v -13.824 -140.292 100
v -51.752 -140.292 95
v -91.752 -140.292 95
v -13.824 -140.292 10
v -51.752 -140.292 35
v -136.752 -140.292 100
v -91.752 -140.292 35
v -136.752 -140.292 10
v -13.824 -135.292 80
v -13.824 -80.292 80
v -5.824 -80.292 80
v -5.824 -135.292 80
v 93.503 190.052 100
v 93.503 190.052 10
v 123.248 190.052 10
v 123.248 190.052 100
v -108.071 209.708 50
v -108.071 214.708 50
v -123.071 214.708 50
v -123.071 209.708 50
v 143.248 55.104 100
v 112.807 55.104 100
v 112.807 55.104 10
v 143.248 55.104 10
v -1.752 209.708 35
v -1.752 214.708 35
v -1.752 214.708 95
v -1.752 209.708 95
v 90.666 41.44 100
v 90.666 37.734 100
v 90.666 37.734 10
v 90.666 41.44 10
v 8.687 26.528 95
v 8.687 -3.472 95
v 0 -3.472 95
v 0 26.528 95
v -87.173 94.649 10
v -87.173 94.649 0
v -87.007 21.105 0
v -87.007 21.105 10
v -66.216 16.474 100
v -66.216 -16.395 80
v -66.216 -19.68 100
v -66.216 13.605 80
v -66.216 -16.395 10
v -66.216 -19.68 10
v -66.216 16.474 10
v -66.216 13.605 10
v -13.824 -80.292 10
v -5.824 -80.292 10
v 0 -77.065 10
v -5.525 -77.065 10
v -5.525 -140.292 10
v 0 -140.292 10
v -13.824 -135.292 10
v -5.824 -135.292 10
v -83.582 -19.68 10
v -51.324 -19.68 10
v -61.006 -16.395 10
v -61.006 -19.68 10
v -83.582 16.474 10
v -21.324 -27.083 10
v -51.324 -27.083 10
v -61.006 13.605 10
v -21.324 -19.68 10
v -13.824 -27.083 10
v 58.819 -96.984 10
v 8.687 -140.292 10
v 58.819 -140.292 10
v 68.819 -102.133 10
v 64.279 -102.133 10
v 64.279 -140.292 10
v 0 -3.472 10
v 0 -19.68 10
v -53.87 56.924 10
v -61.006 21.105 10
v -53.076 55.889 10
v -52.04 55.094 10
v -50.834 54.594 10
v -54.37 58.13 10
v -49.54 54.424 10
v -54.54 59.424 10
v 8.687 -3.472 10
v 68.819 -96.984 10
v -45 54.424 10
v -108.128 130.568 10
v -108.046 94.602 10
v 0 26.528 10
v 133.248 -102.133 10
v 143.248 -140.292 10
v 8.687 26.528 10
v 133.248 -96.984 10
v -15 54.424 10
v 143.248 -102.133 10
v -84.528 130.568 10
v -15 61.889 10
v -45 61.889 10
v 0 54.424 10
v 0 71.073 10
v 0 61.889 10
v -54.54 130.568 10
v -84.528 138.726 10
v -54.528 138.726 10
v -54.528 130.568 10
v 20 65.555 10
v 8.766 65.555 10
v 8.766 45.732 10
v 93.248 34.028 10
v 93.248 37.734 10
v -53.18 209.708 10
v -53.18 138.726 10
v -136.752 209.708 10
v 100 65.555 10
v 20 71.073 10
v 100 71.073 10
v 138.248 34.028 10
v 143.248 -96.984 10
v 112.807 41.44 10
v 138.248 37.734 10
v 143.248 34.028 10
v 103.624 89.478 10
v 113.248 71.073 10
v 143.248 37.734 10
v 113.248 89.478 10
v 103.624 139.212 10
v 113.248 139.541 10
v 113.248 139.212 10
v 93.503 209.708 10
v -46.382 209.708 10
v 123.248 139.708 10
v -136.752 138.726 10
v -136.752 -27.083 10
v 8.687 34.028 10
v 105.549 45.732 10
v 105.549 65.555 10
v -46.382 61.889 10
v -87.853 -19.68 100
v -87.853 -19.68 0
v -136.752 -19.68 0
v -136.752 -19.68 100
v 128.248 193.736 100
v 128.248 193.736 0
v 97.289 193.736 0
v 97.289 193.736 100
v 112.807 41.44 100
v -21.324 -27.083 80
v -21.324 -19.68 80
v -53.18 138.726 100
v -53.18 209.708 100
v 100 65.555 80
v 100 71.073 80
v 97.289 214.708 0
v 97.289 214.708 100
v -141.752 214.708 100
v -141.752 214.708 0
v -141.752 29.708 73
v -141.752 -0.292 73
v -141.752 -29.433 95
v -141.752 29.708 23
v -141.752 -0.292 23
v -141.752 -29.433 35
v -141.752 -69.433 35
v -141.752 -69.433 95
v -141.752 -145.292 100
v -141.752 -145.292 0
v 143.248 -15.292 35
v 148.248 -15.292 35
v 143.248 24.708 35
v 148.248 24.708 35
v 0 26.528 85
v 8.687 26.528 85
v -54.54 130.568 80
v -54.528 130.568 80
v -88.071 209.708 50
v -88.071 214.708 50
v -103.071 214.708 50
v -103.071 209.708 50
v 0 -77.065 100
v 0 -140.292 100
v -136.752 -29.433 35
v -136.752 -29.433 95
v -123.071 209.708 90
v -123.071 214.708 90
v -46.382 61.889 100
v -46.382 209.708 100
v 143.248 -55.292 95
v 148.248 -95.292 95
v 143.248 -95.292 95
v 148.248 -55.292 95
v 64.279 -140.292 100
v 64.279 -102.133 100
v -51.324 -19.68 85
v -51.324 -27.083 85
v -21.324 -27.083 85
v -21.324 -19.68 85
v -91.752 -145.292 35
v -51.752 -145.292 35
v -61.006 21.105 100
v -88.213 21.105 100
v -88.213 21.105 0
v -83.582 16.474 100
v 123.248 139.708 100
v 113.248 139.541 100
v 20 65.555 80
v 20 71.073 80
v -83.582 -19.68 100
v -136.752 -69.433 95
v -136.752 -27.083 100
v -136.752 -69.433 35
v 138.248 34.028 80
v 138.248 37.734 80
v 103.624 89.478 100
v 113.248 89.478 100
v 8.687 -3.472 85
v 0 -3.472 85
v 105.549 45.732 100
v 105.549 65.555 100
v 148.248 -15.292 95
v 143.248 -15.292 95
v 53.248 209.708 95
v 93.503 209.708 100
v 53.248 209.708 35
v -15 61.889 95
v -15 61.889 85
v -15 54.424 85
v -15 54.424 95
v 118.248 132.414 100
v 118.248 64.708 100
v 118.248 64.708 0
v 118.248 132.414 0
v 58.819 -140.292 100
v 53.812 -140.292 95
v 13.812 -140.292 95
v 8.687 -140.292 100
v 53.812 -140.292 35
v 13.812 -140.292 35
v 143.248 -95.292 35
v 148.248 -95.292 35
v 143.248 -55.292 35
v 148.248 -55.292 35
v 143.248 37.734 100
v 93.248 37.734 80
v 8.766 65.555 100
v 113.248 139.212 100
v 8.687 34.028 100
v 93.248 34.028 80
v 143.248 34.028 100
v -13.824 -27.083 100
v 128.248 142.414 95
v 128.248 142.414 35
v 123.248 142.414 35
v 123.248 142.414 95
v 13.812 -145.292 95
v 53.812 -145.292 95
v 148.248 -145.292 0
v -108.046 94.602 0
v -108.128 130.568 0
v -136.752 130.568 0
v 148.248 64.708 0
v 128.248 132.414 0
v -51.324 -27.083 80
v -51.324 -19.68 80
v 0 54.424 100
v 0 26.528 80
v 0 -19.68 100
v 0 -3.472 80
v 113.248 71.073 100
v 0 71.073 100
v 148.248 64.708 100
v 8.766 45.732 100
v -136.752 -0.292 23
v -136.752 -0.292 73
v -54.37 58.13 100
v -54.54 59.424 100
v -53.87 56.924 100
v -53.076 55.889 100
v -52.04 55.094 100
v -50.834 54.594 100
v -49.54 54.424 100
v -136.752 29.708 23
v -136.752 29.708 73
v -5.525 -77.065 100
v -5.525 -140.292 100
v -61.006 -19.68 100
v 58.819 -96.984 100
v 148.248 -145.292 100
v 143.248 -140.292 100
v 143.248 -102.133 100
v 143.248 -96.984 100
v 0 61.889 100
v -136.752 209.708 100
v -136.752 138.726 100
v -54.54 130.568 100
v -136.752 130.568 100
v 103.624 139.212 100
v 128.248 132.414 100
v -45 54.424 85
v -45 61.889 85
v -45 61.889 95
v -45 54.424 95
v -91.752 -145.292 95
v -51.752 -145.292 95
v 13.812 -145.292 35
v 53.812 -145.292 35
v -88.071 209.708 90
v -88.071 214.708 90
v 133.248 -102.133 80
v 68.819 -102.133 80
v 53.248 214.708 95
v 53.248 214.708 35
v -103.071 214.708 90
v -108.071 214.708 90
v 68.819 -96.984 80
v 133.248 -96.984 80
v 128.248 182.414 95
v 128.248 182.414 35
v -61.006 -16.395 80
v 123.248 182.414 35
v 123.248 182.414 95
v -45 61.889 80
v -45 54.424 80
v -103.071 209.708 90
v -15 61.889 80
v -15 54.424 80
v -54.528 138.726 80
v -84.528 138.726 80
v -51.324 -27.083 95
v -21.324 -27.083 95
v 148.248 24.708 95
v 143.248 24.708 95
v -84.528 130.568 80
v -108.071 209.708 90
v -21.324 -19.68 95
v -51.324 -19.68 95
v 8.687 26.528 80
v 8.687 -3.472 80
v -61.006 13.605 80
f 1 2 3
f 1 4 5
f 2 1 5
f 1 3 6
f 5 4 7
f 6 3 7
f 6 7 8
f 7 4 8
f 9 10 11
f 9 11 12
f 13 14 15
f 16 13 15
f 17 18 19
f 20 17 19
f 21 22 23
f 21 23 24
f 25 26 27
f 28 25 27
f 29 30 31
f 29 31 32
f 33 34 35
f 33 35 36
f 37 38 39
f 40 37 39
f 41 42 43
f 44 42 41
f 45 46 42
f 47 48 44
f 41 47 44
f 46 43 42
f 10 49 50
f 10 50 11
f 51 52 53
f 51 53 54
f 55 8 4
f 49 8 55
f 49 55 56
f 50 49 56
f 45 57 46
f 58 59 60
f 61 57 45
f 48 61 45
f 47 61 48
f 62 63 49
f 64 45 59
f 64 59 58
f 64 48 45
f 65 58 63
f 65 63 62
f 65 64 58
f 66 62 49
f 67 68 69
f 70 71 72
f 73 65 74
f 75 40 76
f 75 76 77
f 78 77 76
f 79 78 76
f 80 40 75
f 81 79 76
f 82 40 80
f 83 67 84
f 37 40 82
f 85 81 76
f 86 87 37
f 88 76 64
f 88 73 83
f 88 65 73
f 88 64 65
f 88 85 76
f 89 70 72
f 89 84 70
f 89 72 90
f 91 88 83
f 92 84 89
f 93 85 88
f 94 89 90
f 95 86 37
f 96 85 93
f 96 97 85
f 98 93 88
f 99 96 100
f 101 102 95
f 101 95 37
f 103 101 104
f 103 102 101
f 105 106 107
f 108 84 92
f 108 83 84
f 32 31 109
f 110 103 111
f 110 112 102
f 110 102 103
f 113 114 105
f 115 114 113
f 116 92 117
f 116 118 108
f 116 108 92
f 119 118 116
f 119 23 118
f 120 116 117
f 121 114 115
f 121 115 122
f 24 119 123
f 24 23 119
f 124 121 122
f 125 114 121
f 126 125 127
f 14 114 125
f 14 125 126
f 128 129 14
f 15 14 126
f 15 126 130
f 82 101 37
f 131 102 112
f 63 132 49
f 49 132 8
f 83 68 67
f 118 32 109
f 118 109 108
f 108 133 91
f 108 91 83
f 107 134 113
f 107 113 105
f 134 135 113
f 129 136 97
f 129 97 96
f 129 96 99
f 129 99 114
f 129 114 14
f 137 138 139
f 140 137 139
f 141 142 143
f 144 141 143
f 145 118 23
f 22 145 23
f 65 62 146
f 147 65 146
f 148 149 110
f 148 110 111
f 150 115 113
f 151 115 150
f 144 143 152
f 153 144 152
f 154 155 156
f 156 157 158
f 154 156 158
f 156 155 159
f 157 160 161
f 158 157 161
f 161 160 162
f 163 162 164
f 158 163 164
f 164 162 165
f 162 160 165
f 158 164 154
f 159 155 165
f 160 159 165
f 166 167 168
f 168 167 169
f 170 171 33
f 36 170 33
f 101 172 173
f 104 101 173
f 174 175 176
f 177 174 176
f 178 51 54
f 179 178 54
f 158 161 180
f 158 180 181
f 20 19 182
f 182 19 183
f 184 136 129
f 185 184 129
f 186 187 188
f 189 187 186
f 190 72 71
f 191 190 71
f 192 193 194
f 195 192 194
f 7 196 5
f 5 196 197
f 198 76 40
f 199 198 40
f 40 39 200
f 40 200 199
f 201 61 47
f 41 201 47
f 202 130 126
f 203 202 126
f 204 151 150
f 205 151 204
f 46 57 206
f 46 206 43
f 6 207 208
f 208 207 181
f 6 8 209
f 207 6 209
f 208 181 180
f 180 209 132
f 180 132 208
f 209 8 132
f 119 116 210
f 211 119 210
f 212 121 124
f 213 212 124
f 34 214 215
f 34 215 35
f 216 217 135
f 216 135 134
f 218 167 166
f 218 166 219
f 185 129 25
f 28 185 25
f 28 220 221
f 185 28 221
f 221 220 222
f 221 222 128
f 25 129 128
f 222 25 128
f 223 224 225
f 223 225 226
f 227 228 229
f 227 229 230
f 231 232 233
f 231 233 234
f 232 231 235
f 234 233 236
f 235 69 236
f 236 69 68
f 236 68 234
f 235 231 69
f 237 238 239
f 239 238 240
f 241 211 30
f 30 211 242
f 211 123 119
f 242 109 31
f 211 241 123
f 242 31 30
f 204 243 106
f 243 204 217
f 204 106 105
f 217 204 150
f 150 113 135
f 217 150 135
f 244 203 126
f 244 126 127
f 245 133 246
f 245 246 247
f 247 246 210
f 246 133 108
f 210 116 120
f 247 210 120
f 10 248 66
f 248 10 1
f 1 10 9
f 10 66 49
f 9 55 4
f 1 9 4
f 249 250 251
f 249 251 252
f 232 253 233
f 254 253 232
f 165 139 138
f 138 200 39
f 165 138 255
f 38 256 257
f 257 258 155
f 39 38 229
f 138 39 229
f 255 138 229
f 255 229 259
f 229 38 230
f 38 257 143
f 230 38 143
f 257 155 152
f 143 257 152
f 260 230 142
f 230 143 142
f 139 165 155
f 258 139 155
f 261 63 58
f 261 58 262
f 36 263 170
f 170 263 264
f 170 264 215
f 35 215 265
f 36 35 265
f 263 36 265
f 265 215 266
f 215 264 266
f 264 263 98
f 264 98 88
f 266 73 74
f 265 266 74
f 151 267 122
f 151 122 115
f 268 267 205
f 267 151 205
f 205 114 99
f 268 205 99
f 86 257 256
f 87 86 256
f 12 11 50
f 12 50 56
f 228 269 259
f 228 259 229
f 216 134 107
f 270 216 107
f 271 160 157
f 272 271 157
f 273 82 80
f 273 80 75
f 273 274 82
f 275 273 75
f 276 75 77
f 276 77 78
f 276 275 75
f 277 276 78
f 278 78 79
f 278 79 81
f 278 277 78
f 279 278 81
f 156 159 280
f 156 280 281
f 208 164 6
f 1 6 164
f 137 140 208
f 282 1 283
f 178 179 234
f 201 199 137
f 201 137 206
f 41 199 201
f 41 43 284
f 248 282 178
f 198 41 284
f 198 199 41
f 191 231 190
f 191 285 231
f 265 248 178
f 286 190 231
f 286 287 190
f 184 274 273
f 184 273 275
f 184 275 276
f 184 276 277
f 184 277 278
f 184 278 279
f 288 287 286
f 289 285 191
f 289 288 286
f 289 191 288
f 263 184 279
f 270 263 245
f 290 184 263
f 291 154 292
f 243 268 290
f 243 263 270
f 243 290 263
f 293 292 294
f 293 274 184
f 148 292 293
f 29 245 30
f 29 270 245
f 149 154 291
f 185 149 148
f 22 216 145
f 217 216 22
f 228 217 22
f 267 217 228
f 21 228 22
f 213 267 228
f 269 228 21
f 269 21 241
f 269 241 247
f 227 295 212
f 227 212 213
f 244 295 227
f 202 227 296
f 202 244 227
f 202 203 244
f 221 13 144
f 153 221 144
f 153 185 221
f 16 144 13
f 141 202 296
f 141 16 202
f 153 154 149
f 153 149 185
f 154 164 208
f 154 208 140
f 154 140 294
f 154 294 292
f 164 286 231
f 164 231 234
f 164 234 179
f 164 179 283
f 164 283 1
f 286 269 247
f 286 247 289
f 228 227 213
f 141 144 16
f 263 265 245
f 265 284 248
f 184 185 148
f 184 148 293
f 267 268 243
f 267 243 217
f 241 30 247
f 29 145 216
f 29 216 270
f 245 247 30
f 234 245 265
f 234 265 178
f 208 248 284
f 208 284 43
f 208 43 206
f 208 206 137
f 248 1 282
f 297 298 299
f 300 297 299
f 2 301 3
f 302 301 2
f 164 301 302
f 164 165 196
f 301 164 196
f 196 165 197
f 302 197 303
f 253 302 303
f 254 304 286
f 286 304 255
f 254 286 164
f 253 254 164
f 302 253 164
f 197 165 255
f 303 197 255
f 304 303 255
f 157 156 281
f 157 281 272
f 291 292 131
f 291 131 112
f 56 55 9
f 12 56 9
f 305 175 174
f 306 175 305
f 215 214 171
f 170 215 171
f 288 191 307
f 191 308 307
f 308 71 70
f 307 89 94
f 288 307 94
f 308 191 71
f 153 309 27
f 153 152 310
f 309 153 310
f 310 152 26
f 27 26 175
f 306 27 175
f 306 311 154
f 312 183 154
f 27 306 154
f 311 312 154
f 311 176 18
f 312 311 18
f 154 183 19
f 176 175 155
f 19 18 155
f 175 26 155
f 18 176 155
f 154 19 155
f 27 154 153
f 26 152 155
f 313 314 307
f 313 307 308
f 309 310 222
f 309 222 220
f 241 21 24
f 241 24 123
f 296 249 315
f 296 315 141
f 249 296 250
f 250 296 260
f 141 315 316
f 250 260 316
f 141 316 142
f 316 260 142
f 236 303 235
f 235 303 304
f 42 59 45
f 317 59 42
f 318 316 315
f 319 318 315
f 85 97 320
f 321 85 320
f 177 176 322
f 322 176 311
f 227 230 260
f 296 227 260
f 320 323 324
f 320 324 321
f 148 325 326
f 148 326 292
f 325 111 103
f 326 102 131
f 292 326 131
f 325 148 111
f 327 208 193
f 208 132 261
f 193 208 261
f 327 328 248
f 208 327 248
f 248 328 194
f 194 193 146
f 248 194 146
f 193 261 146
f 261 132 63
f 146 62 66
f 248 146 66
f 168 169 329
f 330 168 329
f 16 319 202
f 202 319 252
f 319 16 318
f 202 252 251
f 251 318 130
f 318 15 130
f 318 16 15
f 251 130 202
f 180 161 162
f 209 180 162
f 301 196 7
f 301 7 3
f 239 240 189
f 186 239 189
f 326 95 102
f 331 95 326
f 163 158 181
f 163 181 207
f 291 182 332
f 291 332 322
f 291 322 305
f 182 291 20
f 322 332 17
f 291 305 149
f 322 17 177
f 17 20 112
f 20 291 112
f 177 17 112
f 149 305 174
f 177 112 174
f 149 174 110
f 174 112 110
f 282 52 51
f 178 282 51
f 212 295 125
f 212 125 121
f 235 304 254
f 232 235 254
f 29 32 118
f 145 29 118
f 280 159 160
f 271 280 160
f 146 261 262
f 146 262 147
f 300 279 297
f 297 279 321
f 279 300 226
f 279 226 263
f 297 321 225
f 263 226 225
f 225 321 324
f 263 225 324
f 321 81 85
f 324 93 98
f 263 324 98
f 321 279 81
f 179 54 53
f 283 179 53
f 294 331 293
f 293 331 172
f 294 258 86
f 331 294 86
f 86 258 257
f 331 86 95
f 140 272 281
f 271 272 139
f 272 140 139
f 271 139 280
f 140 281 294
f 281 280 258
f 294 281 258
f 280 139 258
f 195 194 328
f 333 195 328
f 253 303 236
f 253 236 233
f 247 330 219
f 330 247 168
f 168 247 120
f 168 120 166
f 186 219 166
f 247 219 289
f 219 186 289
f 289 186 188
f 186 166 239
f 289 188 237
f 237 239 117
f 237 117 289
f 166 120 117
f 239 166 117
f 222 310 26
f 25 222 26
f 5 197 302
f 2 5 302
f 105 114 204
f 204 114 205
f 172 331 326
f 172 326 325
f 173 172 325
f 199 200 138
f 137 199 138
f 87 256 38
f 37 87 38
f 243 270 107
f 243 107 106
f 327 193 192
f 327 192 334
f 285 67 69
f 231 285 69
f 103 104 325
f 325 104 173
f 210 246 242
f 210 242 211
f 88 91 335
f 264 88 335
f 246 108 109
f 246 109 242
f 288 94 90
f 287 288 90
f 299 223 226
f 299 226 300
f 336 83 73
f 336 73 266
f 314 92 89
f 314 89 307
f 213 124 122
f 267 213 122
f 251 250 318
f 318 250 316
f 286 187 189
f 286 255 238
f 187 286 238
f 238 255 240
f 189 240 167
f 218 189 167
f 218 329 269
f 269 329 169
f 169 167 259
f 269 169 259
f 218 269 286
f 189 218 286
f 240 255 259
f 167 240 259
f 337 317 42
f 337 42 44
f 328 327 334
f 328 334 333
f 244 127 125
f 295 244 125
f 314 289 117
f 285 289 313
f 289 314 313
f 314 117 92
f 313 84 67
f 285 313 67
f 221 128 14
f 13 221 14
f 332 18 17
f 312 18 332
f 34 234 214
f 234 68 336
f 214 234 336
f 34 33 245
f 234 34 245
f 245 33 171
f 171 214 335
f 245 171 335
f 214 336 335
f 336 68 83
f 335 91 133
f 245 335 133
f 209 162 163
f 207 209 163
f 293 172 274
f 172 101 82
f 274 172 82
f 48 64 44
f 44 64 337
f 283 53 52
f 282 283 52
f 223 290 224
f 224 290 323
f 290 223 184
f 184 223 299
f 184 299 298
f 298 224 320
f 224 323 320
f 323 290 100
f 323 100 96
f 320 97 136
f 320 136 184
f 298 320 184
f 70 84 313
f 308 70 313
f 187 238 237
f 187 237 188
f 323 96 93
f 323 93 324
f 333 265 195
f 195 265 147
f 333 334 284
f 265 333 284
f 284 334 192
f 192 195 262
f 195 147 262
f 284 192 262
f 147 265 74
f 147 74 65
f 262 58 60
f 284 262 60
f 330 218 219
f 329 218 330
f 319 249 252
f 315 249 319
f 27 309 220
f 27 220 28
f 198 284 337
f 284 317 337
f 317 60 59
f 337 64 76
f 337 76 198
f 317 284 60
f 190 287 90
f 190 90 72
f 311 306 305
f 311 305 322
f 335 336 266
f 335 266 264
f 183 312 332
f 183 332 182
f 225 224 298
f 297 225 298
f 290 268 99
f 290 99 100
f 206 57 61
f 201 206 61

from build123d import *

# Parameters (mm, degrees)
F3_DEPTH  = 10
F4_DEPTH  = 100
F1_W      = 17.366
F1_H      = 36.154188
F5_DEPTH  = 100
F6_W      = 40
F6_H      = 60
F7_DEPTH  = 10
F8_W      = 40
F8_H      = 60
F9_DEPTH  = 10
F10_W     = 40
F10_H     = 60
F11_DEPTH = 10
F12_W     = 40
F12_H     = 60
F12_W_2   = 30
F12_H_2   = 50
F13_DEPTH = 10
F14_W     = 15
F14_H     = 40
F14_W_2   = 55
F14_H_2   = 60
F15_DEPTH = 10
F16_W     = 80
F16_H     = 70
F17_DEPTH = 10
F18_W     = 30
F18_H     = 70
F18_H_2   = 10
F19_DEPTH = 10
F20_W     = 30
F20_H     = 70
F20_H_2   = 10
F21_DEPTH = 10
F22_W     = 30
F22_H     = 70
F22_H_2   = 10
F23_DEPTH = 10
F24_W     = 30
F24_H     = 70
F25_DEPTH = 10
F26_R     = 5
F27_W     = 45
F27_H     = 70
F28_DEPTH = 5.6
F29_W     = 55
F29_H     = 70
F30_DEPTH = 8
F31_W     = 64.428788
F31_H     = 70
F32_DEPTH = 10
F33_W     = 30
F33_H     = 70
F34_DEPTH = 10


with BuildPart() as f3:
    # F2 (on Top) → F3 (new body)
    with BuildSketch(Plane.XY):
        Polygon((95.242359, 211.719842), (-138.729709, 211.719842), (-138.342458, 131.481439), (-108.129827, 131.481439), (-108.046199, 94.60168), (-87.173399, 94.649011), (-86.914142, -19.682718), (-137.61172, -19.927398), (-137.295023, -85.54685), (-137.905847, -85.549798), (-137.633327, -142.015695), (144.48047, -142.015695), (144.48047, 61.8671), (113.558467, 61.8671), (113.558467, 138.765142), (124.934341, 138.765142), (124.934341, 192.200884), (95.242359, 192.200884), align=None)
    extrude(amount=F3_DEPTH)

    # F0 (on Top) → F4 (join)
    with BuildSketch(Plane.XY):
        Polygon((97.288959, 214.708266), (-141.752276, 214.708266), (-141.752276, -145.291734), (148.247724, -145.291734), (148.247724, 64.708266), (118.247724, 64.708266), (118.247724, 132.413622), (128.247724, 132.413622), (128.247724, 190.051958), (128.247724, 193.735838), (97.288959, 193.735838), align=None)
        Polygon((0, -140.291734), (-136.752276, -140.291734), (-136.752276, -24.433134), (0, -24.433134), (0, -134.701237), align=None, mode=Mode.SUBTRACT)
        Polygon((-136.752276, 135.399103), (-136.752276, 209.708266), (-52.510735, 209.708266), (-46.752276, 209.708266), (93.502745, 209.708266), (93.502745, 190.051958), (123.247724, 190.051958), (123.247724, 139.708266), (113.247724, 139.541012), (113.247724, 89.373782), (113.247724, 69.708266), (113.247724, 59.708266), (143.247724, 59.708266), (143.247724, 39.708266), (143.247724, -140.291734), (3.247724, -140.291734), (3.247724, -20.291734), (-80.555938, -20.291734), (-86.73545, -20.291734), (-136.752276, -20.291734), (-136.752276, 94.766736), (-136.752276, 99.708266), (-136.752276, 129.708266), align=None, mode=Mode.SUBTRACT)
    extrude(amount=F4_DEPTH)

    # F1 (on Top) → F5 (join)
    with BuildSketch(Plane.XY):
        Polygon((-46.381772, 210.111141), (-53.180333, 210.111141), (-53.180333, 138.726264), (-138.247326, 138.726264), (-138.247326, 130.567983), (-54.540046, 130.567983), (-54.540046, 54.424096), (0, 54.424096), (0, -19.680222), (-61.00649, -19.680222), (-61.00649, 21.1049), (-88.213228, 21.1049), (-87.853, -19.680222), (-137.235827, -19.680222), (-137.206597, -27.083231), (-13.823553, -27.083231), (-13.823553, -77.065498), (-13.823553, -142.692134), (-5.52455, -142.692134), (-5.52455, -77.065498), (0, -77.065498), (0, -143.060565), (8.686575, -143.060565), (8.686575, 34.028415), (90.665676, 34.028415), (145.648941, 34.028415), (145.648941, 37.734261), (90.665676, 37.734261), (90.665676, 41.440107), (112.807184, 41.440107), (112.807184, 55.10395), (137.995422, 55.10395), (143.29809, 55.10395), (144.269308, 61.888803), (114.873245, 61.888803), (114.873245, 71.072504), (0, 71.072504), (0, 61.888803), (-46.381772, 61.888803), align=None)
        with Locations((-74.89929, -1.603128)):
            Rectangle(F1_W, F1_H, mode=Mode.SUBTRACT)
        Polygon((105.549461, 45.731954), (8.765615, 45.731954), (8.765615, 65.555473), (90.949163, 65.555473), (96.314847, 65.555473), (105.549461, 65.555473), (105.549461, 55.10395), align=None, mode=Mode.SUBTRACT)
        Polygon((103.623547, 89.477897), (113.413647, 89.477897), (113.805249, 139.211625), (103.623547, 139.211625), align=None)
        Polygon((58.818936, -96.983925), (58.818936, -141.743556), (64.279255, -141.743556), (64.279255, -102.133363), (144.678116, -102.133363), (144.678116, -96.983925), align=None)
        Polygon((97.186632, 212.130934), (93.550943, 212.130934), (93.550943, 190.134004), (124.809749, 190.134004), (124.809749, 193.531185), (97.186632, 193.531185), align=None)
    extrude(amount=F5_DEPTH)

    # F6 (on face) → F7 (cut)
    with BuildSketch(Plane.YZ.offset(148.247724)):
        with Locations((-75.291734, 65)):
            Rectangle(F6_W, F6_H)
        with Locations((4.708266, 65)):
            Rectangle(F6_W, F6_H)
    extrude(amount=-F7_DEPTH, mode=Mode.SUBTRACT)

    # F8 (on face) → F9 (cut)
    with BuildSketch(Plane.YZ.offset(128.247724)):
        with Locations((162.413622, 65)):
            Rectangle(F8_W, F8_H)
    extrude(amount=-F9_DEPTH, mode=Mode.SUBTRACT)

    # F10 (on face) → F11 (cut)
    with BuildSketch(Plane.XZ.offset(145.291734)):
        with Locations((33.812322, 65)):
            Rectangle(F10_W, F10_H)
        with Locations((-71.752276, 65)):
            Rectangle(F10_W, F10_H)
    extrude(amount=-F11_DEPTH, mode=Mode.SUBTRACT)

    # F12 (on face) → F13 (cut)
    with BuildSketch(Plane(origin=(-141.752276, 0, 0), x_dir=(0, -1, 0), z_dir=(-1, 0, 0))):
        with Locations((49.433134, 65)):
            Rectangle(F12_W, F12_H)
        with Locations((-14.708266, 48)):
            Rectangle(F12_W_2, F12_H_2)
    extrude(amount=-F13_DEPTH, mode=Mode.SUBTRACT)

    # F14 (on face) → F15 (cut)
    with BuildSketch(Plane(origin=(0, 214.708266, 0), x_dir=(-1, 0, 0), z_dir=(0, 1, 0))):
        with Locations((95.571365, 70)):
            Rectangle(F14_W, F14_H)
        with Locations((115.571365, 70)):
            Rectangle(F14_W, F14_H)
        with Locations((-25.747724, 65)):
            Rectangle(F14_W_2, F14_H_2)
    extrude(amount=-F15_DEPTH, mode=Mode.SUBTRACT)

    # F16 (on face) → F17 (cut)
    with BuildSketch(Plane(origin=(0, 71.072504, 0), x_dir=(-1, 0, 0), z_dir=(0, 1, 0))):
        with Locations((-60, 45)):
            Rectangle(F16_W, F16_H)
    extrude(amount=-F17_DEPTH, mode=Mode.SUBTRACT)

    # F18 (on face) → F19 (cut)
    with BuildSketch(Plane(origin=(0, 61.888803, 0), x_dir=(-1, 0, 0), z_dir=(0, 1, 0))):
        with Locations((30, 45)):
            Rectangle(F18_W, F18_H)
        with Locations((30, 90)):
            Rectangle(F18_W, F18_H_2)
    extrude(amount=-F19_DEPTH, mode=Mode.SUBTRACT)

    # F20 (on face) → F21 (cut)
    with BuildSketch(Plane.XZ.offset(27.083231)):
        with Locations((-36.323553, 45)):
            Rectangle(F20_W, F20_H)
        with Locations((-36.323553, 90)):
            Rectangle(F20_W, F20_H_2)
    extrude(amount=-F21_DEPTH, mode=Mode.SUBTRACT)

    # F22 (on face) → F23 (cut)
    with BuildSketch(Plane.YZ.offset(8.686575)):
        with Locations((11.528415, 45)):
            Rectangle(F22_W, F22_H)
        with Locations((11.528415, 90)):
            Rectangle(F22_W, F22_H_2)
    extrude(amount=-F23_DEPTH, mode=Mode.SUBTRACT)

    # F24 (on face) → F25 (cut)
    with BuildSketch(Plane.XZ.offset(-130.567983)):
        with Locations((-69.528099, 45)):
            Rectangle(F24_W, F24_H)
    extrude(amount=-F25_DEPTH, mode=Mode.SUBTRACT)

    # F26
    f26_edges = [f3.edges().sort_by_distance(p)[0] for p in [
        (-54.540046, 54.424096, 55),
    ]]
    fillet(f26_edges, radius=F26_R)

    # F27 (on face) → F28 (cut)
    with BuildSketch(Plane.XZ.offset(-34.028415)):
        with Locations((115.747724, 45)):
            Rectangle(F27_W, F27_H)
    extrude(amount=-F28_DEPTH, mode=Mode.SUBTRACT)

    # F29 (on face) → F30 (cut)
    with BuildSketch(Plane(origin=(-13.823553, 0, 0), x_dir=(0, -1, 0), z_dir=(-1, 0, 0))):
        with Locations((107.791734, 45)):
            Rectangle(F29_W, F29_H)
    extrude(amount=-F30_DEPTH, mode=Mode.SUBTRACT)

    # F31 (on face) → F32 (cut)
    with BuildSketch(Plane(origin=(0, -96.983925, 0), x_dir=(-1, 0, 0), z_dir=(0, 1, 0))):
        with Locations((-101.03333, 45)):
            Rectangle(F31_W, F31_H)
    extrude(amount=-F32_DEPTH, mode=Mode.SUBTRACT)

    # F33 (on face) → F34 (cut)
    with BuildSketch(Plane.YZ.offset(-61.00649)):
        with Locations((-1.3951, 45)):
            Rectangle(F33_W, F33_H)
    extrude(amount=-F34_DEPTH, mode=Mode.SUBTRACT)


solid = f3.part
